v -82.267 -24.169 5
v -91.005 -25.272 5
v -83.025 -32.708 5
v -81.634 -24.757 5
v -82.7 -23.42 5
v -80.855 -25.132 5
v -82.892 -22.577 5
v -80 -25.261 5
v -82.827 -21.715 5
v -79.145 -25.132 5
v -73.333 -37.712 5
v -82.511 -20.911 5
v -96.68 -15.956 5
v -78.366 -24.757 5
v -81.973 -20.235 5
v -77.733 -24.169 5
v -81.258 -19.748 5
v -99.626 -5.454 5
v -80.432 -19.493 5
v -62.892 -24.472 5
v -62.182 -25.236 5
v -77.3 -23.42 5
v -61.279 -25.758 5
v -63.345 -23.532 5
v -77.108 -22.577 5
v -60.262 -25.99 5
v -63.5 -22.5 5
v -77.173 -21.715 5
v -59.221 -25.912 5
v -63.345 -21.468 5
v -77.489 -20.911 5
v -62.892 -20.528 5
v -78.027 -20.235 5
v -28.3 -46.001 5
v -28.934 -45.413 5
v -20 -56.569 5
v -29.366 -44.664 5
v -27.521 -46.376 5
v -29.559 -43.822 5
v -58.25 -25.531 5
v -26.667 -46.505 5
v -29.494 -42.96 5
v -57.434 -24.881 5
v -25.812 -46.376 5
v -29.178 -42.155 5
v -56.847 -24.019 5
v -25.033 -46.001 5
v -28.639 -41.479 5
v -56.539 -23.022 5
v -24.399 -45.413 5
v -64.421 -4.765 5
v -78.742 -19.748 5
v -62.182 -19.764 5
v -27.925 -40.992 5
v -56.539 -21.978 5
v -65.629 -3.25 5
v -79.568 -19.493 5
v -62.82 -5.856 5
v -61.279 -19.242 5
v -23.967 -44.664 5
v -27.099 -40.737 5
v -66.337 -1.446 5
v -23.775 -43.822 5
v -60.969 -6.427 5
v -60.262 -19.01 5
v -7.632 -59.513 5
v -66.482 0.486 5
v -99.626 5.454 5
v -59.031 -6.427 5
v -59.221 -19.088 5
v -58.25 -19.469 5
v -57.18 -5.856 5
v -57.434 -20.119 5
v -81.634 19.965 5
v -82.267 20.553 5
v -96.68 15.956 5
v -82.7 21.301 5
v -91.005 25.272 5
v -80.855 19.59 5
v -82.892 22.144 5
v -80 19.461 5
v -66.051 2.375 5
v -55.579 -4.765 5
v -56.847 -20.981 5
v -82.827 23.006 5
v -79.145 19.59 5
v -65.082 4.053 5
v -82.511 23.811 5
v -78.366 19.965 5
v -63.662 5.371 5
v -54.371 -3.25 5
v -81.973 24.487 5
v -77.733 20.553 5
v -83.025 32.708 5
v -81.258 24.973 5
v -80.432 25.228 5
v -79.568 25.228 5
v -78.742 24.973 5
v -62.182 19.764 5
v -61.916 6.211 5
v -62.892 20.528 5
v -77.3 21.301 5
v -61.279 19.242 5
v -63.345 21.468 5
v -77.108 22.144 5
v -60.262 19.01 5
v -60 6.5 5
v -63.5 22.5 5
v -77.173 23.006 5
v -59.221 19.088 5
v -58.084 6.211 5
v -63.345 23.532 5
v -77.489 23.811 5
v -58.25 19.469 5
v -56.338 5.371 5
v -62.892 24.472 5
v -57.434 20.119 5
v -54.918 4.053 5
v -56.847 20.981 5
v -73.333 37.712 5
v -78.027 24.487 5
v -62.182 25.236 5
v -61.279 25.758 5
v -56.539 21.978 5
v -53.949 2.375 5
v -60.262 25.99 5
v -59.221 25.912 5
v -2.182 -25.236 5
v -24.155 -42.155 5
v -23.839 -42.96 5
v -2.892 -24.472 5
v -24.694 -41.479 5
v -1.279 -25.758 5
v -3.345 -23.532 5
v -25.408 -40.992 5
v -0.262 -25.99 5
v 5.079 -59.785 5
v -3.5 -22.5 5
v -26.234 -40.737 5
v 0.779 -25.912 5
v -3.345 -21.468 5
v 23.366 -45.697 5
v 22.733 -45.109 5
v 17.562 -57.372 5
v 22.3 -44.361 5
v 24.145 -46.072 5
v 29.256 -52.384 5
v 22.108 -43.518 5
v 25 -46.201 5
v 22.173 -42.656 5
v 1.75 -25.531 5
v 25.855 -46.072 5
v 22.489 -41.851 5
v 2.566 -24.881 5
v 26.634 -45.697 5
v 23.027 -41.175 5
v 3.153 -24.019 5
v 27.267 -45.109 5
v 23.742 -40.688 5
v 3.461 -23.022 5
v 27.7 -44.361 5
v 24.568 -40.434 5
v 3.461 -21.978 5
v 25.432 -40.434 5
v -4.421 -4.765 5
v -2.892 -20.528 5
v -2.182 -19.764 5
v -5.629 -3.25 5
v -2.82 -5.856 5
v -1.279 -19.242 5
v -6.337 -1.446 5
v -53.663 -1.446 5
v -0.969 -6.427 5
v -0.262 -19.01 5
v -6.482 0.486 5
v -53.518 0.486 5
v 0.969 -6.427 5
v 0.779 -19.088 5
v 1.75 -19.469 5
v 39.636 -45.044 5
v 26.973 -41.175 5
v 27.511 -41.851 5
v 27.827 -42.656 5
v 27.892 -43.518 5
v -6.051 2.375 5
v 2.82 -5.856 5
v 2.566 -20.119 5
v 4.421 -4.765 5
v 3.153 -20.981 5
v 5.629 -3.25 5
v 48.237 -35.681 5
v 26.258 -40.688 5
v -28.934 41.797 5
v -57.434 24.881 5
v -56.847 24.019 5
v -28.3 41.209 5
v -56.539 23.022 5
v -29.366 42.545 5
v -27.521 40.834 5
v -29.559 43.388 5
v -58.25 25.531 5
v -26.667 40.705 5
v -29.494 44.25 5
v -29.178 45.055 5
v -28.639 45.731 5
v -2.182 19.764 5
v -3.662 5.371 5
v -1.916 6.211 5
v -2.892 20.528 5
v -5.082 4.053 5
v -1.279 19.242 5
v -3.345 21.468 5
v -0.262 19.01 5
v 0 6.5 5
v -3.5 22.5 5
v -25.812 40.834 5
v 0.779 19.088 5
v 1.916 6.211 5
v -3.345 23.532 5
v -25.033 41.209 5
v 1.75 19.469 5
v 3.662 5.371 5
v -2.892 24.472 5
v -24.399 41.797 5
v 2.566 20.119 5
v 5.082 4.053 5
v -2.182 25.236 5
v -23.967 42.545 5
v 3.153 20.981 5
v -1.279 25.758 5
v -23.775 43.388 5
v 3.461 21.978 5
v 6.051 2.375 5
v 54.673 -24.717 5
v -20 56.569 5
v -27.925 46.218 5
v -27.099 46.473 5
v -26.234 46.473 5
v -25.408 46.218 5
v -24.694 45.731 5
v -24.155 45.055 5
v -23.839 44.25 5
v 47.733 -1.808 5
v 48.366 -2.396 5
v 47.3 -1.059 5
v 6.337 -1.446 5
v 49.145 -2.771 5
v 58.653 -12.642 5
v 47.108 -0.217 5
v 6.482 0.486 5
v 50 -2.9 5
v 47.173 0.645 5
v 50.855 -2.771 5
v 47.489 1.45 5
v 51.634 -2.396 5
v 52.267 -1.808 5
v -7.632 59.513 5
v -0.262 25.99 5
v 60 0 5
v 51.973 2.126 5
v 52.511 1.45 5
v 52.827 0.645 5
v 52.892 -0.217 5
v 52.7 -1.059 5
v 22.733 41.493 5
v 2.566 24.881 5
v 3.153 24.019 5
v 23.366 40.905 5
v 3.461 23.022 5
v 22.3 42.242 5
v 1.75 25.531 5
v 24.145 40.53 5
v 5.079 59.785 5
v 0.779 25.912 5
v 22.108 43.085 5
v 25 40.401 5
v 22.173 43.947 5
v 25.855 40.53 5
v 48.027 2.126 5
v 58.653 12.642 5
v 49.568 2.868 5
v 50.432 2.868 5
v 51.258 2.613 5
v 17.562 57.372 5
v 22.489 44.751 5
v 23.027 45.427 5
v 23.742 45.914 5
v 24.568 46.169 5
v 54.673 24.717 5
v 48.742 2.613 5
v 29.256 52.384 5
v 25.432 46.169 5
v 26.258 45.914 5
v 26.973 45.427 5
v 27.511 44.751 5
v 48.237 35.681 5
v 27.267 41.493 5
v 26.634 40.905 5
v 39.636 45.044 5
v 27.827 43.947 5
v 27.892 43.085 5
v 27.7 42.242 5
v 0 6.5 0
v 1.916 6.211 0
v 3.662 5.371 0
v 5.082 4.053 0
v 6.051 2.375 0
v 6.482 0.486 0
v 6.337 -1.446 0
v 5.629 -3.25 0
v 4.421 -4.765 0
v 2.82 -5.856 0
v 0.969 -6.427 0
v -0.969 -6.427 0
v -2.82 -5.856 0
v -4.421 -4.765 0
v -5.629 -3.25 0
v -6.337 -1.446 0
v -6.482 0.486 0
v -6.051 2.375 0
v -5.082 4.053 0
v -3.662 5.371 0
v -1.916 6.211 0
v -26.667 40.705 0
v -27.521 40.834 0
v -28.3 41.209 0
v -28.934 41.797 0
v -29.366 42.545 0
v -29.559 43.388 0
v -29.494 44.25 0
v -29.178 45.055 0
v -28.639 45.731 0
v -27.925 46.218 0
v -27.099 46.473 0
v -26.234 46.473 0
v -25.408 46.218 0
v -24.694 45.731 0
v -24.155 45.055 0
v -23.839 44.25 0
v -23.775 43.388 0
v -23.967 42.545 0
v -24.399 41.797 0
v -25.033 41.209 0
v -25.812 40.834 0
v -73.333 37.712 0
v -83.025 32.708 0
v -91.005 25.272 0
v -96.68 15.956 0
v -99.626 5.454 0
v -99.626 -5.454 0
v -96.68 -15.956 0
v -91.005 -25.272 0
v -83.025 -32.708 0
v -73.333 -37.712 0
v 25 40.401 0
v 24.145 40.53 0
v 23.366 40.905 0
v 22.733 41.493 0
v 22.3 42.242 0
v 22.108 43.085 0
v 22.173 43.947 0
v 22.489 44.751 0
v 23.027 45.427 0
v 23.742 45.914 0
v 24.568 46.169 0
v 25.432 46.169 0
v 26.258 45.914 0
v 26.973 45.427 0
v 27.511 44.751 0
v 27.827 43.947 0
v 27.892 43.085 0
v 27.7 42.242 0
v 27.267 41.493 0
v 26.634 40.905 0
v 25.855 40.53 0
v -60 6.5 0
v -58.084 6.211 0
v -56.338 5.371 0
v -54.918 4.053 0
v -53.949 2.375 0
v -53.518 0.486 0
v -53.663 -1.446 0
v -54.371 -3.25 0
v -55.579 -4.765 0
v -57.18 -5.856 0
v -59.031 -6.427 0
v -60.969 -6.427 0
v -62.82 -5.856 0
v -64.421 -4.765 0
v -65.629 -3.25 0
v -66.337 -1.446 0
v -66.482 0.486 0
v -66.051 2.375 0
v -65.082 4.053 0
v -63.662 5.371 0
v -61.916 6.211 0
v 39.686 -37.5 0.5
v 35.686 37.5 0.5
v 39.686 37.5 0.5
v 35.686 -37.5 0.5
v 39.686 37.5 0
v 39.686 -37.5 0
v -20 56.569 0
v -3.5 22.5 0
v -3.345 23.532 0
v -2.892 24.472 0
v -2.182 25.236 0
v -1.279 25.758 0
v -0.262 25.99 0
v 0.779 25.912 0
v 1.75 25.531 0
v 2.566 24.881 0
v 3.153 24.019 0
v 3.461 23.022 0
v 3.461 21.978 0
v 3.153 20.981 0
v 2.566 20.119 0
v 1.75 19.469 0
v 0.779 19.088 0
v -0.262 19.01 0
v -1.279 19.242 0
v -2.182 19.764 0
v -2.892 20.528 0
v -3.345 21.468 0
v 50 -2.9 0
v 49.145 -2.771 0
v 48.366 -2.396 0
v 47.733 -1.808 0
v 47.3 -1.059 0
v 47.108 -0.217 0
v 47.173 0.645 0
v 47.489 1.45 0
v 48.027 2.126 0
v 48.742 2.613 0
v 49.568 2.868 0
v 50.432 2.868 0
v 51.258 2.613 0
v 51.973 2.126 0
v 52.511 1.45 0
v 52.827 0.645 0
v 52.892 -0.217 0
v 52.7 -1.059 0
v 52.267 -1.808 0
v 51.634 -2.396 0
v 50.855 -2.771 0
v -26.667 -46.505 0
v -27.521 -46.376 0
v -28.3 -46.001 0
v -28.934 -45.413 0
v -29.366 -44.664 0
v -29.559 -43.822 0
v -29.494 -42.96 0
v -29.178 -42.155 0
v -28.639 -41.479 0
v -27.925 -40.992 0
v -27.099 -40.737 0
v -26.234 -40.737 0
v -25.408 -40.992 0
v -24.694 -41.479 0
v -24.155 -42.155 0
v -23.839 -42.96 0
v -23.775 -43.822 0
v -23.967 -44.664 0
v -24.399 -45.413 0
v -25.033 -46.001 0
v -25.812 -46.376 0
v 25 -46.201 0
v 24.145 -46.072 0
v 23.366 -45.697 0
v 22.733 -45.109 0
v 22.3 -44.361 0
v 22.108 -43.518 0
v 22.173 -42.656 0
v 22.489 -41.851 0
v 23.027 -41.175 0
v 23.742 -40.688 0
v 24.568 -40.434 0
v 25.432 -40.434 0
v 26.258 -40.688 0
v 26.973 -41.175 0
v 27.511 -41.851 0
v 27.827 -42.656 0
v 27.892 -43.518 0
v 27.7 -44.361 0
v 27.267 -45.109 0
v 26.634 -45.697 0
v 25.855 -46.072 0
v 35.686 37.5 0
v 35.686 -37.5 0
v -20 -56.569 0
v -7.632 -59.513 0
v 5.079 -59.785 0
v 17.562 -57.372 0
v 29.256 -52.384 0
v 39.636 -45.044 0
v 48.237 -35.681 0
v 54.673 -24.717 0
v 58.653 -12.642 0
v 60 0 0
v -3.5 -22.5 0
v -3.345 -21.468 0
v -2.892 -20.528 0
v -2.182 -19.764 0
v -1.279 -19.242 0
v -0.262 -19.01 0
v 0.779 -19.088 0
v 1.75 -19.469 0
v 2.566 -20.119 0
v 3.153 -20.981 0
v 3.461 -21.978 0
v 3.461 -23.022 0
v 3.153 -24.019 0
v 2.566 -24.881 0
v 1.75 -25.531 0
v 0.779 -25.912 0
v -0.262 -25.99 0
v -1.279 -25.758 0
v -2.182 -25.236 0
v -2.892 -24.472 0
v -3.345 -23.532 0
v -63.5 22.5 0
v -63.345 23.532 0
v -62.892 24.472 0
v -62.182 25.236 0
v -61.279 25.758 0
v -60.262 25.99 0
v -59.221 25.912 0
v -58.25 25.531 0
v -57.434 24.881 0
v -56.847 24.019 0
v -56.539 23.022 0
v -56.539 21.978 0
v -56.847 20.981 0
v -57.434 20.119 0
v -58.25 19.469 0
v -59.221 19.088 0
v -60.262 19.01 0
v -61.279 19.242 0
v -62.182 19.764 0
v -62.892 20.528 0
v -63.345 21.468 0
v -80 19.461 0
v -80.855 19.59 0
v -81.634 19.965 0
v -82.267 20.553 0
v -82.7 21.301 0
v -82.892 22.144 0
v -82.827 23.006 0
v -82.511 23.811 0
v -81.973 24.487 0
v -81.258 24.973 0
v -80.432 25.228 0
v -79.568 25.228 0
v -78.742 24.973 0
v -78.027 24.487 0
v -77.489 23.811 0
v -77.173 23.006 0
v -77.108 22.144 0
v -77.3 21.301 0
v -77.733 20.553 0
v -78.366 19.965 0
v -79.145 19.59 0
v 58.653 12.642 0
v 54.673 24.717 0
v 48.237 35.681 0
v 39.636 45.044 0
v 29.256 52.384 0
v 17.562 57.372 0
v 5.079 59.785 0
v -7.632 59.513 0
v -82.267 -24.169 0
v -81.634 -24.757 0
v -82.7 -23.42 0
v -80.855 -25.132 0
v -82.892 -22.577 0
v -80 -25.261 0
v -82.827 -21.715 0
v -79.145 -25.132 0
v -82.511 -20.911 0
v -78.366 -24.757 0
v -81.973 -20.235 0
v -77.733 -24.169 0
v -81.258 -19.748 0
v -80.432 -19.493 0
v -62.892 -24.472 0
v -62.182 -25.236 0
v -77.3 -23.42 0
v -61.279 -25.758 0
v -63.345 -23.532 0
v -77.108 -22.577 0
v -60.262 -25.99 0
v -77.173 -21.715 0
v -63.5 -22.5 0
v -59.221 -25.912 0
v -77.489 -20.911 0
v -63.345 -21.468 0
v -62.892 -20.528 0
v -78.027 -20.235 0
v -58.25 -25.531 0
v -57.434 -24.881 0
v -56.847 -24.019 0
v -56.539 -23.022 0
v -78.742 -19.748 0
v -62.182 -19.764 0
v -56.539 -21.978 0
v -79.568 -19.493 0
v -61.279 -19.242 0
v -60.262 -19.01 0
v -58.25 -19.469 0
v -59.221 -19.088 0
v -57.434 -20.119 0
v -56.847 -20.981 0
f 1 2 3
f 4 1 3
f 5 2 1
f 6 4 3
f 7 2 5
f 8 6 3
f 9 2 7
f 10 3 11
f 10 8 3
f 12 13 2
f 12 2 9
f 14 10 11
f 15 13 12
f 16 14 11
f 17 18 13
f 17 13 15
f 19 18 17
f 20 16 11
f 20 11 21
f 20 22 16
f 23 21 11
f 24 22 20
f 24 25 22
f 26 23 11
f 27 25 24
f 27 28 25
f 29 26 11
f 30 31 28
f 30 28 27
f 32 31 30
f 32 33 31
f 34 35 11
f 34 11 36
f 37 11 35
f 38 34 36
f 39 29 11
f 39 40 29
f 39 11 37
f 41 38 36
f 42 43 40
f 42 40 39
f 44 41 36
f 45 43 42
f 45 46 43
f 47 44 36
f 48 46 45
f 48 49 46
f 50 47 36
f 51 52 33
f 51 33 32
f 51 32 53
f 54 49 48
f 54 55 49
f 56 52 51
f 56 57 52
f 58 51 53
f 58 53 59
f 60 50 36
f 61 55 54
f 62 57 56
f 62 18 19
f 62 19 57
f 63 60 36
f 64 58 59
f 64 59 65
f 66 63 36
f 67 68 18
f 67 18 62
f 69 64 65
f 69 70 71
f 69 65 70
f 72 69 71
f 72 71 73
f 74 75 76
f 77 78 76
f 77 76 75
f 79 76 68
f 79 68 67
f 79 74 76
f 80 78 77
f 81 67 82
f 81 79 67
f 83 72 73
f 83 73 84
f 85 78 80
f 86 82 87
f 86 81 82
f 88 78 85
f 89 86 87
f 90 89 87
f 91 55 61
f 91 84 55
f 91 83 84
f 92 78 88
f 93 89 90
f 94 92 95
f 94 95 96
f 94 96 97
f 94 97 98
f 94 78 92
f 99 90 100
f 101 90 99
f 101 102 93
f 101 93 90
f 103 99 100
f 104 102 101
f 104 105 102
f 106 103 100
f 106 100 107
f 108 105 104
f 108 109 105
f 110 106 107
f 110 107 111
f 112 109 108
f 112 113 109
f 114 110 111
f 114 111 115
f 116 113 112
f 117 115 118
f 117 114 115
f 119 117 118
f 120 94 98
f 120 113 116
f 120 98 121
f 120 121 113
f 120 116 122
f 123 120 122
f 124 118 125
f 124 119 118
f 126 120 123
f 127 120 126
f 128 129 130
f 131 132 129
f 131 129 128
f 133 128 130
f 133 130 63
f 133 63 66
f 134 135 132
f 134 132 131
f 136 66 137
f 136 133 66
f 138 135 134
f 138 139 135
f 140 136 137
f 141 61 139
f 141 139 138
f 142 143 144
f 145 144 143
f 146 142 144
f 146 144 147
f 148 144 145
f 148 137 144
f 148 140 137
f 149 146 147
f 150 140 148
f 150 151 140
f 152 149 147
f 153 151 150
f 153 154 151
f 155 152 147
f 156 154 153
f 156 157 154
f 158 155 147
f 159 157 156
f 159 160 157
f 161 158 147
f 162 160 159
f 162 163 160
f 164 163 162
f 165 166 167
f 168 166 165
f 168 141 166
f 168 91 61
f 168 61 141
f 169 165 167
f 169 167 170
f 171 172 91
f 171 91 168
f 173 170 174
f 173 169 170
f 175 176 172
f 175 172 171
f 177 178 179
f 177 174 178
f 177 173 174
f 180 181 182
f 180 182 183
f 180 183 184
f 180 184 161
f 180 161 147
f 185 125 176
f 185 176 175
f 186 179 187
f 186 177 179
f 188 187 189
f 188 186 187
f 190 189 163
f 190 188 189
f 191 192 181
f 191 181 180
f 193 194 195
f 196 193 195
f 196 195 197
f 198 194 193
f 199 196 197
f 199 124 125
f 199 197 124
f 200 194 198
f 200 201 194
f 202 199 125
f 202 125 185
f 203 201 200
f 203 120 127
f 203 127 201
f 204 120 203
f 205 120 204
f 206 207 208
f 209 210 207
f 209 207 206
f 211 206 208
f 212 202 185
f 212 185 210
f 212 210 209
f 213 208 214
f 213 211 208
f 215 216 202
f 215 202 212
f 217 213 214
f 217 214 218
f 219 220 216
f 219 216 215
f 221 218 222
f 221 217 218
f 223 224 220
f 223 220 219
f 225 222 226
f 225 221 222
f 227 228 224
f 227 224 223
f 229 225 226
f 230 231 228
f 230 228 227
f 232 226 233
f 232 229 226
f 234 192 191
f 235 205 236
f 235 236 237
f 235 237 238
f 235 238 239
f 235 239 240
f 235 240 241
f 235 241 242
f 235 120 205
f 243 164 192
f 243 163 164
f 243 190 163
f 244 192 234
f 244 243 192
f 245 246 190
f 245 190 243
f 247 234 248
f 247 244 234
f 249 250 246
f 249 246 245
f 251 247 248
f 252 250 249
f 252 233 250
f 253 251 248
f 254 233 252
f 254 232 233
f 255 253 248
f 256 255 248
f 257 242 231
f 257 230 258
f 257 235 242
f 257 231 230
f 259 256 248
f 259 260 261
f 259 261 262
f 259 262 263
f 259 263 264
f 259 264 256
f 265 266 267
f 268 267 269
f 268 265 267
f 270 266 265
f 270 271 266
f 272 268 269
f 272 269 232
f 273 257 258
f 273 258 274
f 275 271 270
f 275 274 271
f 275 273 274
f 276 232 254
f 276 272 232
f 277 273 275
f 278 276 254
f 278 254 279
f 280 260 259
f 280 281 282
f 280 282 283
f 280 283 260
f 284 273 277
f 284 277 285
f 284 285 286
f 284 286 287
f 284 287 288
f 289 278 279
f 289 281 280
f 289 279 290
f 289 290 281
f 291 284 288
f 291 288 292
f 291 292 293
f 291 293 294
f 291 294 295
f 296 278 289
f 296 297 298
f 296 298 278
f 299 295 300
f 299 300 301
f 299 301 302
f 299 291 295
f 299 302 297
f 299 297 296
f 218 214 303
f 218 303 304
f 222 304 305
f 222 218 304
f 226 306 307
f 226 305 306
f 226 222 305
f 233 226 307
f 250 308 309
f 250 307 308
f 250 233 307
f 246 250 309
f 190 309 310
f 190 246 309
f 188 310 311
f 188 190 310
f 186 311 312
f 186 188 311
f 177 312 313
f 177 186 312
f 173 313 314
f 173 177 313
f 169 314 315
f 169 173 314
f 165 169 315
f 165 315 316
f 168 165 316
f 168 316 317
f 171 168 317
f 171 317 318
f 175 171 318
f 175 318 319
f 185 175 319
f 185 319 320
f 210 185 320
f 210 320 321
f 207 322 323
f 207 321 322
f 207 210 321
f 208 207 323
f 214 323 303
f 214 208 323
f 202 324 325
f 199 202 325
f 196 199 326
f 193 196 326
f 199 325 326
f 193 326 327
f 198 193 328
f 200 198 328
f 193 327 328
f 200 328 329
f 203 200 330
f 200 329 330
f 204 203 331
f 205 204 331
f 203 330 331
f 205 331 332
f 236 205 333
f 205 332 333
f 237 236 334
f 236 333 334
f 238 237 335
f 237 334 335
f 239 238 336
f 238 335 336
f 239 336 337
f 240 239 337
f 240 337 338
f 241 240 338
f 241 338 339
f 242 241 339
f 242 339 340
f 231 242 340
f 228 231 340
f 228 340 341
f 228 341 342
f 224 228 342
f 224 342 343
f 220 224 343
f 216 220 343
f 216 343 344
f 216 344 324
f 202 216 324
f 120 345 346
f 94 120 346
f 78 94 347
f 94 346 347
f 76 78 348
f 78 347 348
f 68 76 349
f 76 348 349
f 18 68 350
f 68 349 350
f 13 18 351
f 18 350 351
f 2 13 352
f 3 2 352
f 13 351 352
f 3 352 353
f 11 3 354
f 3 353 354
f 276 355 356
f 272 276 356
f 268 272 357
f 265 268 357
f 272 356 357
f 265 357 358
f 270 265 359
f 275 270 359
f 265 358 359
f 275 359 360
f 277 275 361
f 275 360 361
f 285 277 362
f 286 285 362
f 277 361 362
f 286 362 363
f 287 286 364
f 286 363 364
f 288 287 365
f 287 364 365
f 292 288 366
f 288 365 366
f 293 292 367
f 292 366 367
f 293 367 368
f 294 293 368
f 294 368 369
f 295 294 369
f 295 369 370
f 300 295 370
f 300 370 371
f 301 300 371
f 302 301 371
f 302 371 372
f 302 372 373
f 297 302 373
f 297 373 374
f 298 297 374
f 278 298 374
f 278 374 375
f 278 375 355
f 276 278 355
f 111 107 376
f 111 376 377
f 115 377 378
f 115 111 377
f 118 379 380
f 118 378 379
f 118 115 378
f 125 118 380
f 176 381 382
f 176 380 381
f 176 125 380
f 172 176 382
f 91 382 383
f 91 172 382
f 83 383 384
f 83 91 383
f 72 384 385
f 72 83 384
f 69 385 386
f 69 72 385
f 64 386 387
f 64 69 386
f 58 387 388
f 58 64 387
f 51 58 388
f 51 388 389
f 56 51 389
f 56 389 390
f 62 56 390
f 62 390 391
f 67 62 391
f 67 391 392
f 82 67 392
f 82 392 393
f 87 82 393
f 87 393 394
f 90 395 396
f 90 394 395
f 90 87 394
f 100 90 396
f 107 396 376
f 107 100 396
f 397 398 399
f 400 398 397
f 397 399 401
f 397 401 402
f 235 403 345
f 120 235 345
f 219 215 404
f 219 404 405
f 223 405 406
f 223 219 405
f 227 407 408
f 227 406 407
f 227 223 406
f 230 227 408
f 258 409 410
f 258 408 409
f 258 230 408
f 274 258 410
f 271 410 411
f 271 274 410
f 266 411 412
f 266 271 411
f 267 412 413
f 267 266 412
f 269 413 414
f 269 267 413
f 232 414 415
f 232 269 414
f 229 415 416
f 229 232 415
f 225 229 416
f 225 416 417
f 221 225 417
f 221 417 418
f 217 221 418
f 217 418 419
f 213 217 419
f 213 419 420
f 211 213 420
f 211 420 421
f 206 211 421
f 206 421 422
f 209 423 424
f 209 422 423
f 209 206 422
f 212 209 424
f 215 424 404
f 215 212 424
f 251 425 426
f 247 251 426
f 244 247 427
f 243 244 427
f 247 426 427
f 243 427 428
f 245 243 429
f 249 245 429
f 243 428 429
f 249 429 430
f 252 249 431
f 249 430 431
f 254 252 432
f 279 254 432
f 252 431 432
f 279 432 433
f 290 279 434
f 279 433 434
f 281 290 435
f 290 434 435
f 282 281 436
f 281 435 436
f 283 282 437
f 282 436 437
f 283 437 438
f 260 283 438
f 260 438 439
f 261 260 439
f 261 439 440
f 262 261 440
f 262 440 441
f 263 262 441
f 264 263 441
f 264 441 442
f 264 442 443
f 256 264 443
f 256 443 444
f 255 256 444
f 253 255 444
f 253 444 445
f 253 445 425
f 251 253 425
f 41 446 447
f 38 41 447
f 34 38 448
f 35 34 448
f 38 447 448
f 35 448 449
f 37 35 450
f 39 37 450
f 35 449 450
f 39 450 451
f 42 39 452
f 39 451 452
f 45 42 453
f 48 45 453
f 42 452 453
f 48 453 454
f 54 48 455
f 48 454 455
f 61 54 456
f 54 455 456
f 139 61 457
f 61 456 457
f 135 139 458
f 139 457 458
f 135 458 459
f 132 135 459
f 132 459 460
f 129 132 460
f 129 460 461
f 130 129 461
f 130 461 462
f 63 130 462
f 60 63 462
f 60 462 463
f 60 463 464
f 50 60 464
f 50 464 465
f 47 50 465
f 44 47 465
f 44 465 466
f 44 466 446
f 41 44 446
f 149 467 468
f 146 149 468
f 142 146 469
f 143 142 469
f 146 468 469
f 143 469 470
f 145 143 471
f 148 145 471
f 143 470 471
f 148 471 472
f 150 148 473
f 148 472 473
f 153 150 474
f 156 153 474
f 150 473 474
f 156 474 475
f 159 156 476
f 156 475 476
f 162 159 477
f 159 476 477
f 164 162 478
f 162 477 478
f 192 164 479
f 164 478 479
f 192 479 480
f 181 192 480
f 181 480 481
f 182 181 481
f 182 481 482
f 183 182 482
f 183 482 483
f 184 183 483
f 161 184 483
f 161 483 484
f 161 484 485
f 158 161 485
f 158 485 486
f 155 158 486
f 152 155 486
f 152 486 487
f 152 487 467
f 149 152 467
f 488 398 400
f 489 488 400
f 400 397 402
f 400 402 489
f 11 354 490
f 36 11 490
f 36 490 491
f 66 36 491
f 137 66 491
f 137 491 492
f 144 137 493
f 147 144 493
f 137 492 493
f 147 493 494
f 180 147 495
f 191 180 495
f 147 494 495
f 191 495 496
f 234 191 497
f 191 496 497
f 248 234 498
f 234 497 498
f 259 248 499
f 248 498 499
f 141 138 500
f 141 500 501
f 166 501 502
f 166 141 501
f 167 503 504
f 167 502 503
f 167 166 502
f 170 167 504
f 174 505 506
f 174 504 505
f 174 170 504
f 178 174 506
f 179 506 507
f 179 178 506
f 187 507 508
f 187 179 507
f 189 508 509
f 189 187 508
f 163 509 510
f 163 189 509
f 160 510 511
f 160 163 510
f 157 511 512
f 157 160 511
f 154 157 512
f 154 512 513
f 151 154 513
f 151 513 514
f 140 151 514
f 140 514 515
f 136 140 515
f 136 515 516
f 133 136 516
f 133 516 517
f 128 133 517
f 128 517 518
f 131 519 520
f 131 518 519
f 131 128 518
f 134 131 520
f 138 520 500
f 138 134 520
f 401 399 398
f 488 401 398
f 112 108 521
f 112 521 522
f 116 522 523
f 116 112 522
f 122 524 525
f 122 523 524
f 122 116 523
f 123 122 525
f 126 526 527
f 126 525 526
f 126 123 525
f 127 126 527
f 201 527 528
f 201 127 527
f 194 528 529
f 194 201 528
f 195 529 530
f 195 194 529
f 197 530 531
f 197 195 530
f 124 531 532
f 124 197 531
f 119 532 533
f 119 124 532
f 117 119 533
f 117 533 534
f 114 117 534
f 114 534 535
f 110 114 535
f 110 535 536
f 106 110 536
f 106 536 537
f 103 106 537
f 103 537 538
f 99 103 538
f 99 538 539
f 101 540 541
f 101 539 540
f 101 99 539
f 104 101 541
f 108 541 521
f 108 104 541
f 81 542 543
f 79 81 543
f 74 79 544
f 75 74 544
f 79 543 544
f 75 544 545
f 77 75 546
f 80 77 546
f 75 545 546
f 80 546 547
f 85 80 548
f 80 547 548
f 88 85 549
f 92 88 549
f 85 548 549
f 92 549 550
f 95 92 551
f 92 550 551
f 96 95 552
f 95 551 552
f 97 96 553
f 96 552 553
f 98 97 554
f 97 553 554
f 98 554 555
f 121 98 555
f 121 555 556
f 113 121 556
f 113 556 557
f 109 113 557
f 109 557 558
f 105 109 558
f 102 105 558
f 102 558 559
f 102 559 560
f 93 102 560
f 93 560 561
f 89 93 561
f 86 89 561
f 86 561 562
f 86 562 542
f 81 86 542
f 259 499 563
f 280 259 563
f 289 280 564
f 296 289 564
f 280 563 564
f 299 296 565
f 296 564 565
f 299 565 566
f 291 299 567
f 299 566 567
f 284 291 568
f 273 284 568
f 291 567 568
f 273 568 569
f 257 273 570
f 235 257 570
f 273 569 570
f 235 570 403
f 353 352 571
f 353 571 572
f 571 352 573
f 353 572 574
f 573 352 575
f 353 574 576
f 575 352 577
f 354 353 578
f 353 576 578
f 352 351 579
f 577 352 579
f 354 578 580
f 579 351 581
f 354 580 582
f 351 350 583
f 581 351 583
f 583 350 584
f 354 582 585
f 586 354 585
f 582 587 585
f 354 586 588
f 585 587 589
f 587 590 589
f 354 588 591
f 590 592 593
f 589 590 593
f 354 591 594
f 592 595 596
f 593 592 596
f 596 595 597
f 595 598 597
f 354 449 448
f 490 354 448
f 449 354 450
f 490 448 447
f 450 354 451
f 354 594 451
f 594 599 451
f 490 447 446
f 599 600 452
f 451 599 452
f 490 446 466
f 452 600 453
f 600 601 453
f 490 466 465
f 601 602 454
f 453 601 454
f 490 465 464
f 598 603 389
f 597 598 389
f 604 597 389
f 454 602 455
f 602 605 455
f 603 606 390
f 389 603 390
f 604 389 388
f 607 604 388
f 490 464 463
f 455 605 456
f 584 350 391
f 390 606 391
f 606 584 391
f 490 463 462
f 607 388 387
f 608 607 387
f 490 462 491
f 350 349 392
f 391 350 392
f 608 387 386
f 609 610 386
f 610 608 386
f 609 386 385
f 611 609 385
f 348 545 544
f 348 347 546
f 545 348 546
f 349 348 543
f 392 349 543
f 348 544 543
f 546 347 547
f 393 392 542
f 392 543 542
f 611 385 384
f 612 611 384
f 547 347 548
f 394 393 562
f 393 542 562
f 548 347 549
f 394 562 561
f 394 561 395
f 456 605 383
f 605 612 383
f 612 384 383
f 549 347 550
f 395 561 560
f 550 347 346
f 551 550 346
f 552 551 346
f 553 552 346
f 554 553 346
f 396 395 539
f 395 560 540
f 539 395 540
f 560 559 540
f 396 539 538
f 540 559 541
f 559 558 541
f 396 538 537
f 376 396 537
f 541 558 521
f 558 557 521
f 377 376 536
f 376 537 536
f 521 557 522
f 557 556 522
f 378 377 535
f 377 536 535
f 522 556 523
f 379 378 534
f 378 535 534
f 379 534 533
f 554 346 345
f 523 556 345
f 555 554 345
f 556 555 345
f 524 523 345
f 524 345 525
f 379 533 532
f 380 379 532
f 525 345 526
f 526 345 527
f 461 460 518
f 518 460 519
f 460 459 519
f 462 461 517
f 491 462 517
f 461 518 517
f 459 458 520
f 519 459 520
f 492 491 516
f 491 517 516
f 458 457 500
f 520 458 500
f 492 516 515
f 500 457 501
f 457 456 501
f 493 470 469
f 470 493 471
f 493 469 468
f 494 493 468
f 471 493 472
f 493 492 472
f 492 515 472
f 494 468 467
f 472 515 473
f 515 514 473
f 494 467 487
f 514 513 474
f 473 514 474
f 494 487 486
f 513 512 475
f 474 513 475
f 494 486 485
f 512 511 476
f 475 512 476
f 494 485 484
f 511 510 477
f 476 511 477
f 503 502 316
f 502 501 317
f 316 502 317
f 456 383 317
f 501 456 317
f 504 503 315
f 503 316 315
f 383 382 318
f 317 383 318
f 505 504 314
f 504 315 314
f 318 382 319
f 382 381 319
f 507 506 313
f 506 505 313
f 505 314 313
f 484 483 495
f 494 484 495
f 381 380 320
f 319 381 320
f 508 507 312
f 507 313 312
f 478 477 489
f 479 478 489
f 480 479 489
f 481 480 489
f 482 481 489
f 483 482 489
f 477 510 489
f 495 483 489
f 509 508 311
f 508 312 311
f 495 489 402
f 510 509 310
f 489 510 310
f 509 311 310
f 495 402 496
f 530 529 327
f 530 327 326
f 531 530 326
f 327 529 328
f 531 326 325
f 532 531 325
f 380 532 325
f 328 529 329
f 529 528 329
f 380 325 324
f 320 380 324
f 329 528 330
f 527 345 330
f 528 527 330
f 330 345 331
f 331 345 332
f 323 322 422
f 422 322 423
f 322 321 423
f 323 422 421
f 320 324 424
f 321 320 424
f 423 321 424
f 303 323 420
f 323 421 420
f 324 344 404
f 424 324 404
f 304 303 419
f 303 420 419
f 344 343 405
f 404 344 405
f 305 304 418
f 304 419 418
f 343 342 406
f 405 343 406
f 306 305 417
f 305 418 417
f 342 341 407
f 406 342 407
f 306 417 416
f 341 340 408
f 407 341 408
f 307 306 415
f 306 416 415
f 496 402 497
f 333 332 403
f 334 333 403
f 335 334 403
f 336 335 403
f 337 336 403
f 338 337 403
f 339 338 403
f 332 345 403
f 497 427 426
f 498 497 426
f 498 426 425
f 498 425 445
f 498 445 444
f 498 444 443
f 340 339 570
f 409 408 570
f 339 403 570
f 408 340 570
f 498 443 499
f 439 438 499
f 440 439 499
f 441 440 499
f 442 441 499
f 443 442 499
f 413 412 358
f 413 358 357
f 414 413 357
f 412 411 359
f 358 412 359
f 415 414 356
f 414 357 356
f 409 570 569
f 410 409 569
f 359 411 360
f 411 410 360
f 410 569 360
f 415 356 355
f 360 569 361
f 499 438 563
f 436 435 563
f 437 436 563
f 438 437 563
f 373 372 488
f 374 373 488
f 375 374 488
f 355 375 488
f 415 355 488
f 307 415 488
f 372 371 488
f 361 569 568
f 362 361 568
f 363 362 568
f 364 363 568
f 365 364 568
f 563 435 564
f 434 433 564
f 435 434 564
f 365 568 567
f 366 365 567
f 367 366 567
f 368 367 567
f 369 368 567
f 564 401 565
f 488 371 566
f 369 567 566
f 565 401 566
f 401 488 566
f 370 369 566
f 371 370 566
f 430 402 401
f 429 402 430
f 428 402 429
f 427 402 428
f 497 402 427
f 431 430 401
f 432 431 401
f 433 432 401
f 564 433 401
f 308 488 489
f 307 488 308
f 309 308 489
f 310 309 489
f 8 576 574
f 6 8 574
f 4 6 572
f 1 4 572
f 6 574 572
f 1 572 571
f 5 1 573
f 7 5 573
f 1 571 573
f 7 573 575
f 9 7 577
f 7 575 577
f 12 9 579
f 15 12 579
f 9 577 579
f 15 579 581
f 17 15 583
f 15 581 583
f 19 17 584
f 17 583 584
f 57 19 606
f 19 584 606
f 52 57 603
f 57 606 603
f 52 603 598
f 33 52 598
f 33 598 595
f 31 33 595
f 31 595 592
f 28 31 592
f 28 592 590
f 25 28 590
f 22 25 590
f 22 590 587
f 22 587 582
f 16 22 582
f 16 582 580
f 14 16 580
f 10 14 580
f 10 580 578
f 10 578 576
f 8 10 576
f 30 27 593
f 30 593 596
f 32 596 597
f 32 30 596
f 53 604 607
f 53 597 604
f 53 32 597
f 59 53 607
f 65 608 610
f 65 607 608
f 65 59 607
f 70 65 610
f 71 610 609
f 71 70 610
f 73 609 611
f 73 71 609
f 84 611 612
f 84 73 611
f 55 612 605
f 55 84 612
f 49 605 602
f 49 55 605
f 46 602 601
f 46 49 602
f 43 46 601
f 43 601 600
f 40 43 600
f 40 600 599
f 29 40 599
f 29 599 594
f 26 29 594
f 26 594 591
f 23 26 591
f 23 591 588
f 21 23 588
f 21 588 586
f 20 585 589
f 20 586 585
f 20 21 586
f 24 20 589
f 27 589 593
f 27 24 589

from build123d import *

# Parameters (mm, degrees)
BOSS_EXTRU_1_DEPTH           = 5
ENL_V_MAT_EXTRU_1_DEPTH      = 131.1355063
ENL_V_MAT_EXTRU_1_DEPTH_BACK = 140
ESQUISSE2_R                  = 3.5
D_GAGEMENT_M51_D             = 5.8
D_GAGEMENT_M51_DEPTH         = 90
D_GAGEMENT_M51_TIP           = 1.742495795
ENL_V_MAT_EXTRU_3_DEPTH      = 167.883192683
ENL_V_MAT_EXTRU_3_DEPTH_BACK = 167.883192683
ESQUISSE6_R                  = 6.5
ENL_V_START                  = -0.5
ESQUISSE7_W                  = 75
ESQUISSE7_H                  = 4
ENL_V_MAT_EXTRU_4_DEPTH      = 0.5


with BuildPart() as part:
    # Esquisse1 → Boss.-Extru.1 (new body)
    with BuildSketch(Plane.XY):
        with BuildLine():
            Line((-20, 56.568542495), (-73.333333333, 37.712361663))
            ThreePointArc((-73.333333333, 37.712361663), (-100, 0), (-73.333333333, -37.712361663))
            Line((-73.333333333, -37.712361663), (-20, -56.568542495))
            ThreePointArc((-20, -56.568542495), (34.641016151, -48.989794856), (60, 0))
            ThreePointArc((60, 0), (34.641016151, 48.989794856), (-20, 56.568542495))
        make_face()
    extrude(amount=BOSS_EXTRU_1_DEPTH)

    # Esquisse2 → Enlèv. mat.-Extru.1 (cut, two sides: drawn at the far end of the back side and taken through both)
    with BuildSketch(Plane(origin=(15, 0, -5.5), x_dir=(0, -1, 0), z_dir=(0, 0, -1)).offset(-ENL_V_MAT_EXTRU_1_DEPTH_BACK)):
        with Locations(Location((-22.5, 15, 0), (0, 0, 90))):
            Circle(ESQUISSE2_R)
        with Locations(Location((22.5, 15, 0), (0, 0, 90))):
            Circle(ESQUISSE2_R)
        with Locations(Location((22.5, 75, 0), (0, 0, 90))):
            Circle(ESQUISSE2_R)
        with Locations(Location((-22.5, 75, 0), (0, 0, 90))):
            Circle(ESQUISSE2_R)
    extrude(amount=ENL_V_MAT_EXTRU_1_DEPTH + ENL_V_MAT_EXTRU_1_DEPTH_BACK, mode=Mode.SUBTRACT)

    # Dégagement M51
    with Locations(Plane(origin=(15, 0, 48), x_dir=(0, 1, 0), z_dir=(0, 0, 1))):
        with Locations((43.604918173, 41.666666667), (0, -35), (-43.301270189, -10), (43.301270189, -10), (-22.360679775, 95), (22.360679775, 95), (-43.604918173, 41.666666667)):
            Hole(D_GAGEMENT_M51_D / 2, depth=D_GAGEMENT_M51_DEPTH)
            with Locations((0, 0, -(D_GAGEMENT_M51_DEPTH + D_GAGEMENT_M51_TIP / 2))):  # 118° drill point
                Cone(0, D_GAGEMENT_M51_D / 2, D_GAGEMENT_M51_TIP, mode=Mode.SUBTRACT)

    # Esquisse6 → Enlèv. mat.-Extru.3 (cut, two sides: drawn at the far end of the back side and taken through both)
    with BuildSketch(Plane(origin=(15, 0, -100), x_dir=(0, -1, 0), z_dir=(0, 0, -1)).offset(-ENL_V_MAT_EXTRU_3_DEPTH_BACK)):
        with Locations(Location((0, 15, 0), (0, 0, 180))):
            Circle(ESQUISSE6_R)
        with Locations(Location((0, 75, 0), (0, 0, 180))):
            Circle(ESQUISSE6_R)
    extrude(amount=ENL_V_MAT_EXTRU_3_DEPTH + ENL_V_MAT_EXTRU_3_DEPTH_BACK, mode=Mode.SUBTRACT)

    # Esquisse7 → Enlèv. mat.-Extru.4 (cut)
    with BuildSketch(Plane(origin=(15, 0, 0), x_dir=(0, -1, 0), z_dir=(0, 0, -1)).offset(ENL_V_START)):
        with Locations((0, -22.686269666)):
            Rectangle(ESQUISSE7_W, ESQUISSE7_H)
    extrude(amount=ENL_V_MAT_EXTRU_4_DEPTH, mode=Mode.SUBTRACT)


solid = part.part
